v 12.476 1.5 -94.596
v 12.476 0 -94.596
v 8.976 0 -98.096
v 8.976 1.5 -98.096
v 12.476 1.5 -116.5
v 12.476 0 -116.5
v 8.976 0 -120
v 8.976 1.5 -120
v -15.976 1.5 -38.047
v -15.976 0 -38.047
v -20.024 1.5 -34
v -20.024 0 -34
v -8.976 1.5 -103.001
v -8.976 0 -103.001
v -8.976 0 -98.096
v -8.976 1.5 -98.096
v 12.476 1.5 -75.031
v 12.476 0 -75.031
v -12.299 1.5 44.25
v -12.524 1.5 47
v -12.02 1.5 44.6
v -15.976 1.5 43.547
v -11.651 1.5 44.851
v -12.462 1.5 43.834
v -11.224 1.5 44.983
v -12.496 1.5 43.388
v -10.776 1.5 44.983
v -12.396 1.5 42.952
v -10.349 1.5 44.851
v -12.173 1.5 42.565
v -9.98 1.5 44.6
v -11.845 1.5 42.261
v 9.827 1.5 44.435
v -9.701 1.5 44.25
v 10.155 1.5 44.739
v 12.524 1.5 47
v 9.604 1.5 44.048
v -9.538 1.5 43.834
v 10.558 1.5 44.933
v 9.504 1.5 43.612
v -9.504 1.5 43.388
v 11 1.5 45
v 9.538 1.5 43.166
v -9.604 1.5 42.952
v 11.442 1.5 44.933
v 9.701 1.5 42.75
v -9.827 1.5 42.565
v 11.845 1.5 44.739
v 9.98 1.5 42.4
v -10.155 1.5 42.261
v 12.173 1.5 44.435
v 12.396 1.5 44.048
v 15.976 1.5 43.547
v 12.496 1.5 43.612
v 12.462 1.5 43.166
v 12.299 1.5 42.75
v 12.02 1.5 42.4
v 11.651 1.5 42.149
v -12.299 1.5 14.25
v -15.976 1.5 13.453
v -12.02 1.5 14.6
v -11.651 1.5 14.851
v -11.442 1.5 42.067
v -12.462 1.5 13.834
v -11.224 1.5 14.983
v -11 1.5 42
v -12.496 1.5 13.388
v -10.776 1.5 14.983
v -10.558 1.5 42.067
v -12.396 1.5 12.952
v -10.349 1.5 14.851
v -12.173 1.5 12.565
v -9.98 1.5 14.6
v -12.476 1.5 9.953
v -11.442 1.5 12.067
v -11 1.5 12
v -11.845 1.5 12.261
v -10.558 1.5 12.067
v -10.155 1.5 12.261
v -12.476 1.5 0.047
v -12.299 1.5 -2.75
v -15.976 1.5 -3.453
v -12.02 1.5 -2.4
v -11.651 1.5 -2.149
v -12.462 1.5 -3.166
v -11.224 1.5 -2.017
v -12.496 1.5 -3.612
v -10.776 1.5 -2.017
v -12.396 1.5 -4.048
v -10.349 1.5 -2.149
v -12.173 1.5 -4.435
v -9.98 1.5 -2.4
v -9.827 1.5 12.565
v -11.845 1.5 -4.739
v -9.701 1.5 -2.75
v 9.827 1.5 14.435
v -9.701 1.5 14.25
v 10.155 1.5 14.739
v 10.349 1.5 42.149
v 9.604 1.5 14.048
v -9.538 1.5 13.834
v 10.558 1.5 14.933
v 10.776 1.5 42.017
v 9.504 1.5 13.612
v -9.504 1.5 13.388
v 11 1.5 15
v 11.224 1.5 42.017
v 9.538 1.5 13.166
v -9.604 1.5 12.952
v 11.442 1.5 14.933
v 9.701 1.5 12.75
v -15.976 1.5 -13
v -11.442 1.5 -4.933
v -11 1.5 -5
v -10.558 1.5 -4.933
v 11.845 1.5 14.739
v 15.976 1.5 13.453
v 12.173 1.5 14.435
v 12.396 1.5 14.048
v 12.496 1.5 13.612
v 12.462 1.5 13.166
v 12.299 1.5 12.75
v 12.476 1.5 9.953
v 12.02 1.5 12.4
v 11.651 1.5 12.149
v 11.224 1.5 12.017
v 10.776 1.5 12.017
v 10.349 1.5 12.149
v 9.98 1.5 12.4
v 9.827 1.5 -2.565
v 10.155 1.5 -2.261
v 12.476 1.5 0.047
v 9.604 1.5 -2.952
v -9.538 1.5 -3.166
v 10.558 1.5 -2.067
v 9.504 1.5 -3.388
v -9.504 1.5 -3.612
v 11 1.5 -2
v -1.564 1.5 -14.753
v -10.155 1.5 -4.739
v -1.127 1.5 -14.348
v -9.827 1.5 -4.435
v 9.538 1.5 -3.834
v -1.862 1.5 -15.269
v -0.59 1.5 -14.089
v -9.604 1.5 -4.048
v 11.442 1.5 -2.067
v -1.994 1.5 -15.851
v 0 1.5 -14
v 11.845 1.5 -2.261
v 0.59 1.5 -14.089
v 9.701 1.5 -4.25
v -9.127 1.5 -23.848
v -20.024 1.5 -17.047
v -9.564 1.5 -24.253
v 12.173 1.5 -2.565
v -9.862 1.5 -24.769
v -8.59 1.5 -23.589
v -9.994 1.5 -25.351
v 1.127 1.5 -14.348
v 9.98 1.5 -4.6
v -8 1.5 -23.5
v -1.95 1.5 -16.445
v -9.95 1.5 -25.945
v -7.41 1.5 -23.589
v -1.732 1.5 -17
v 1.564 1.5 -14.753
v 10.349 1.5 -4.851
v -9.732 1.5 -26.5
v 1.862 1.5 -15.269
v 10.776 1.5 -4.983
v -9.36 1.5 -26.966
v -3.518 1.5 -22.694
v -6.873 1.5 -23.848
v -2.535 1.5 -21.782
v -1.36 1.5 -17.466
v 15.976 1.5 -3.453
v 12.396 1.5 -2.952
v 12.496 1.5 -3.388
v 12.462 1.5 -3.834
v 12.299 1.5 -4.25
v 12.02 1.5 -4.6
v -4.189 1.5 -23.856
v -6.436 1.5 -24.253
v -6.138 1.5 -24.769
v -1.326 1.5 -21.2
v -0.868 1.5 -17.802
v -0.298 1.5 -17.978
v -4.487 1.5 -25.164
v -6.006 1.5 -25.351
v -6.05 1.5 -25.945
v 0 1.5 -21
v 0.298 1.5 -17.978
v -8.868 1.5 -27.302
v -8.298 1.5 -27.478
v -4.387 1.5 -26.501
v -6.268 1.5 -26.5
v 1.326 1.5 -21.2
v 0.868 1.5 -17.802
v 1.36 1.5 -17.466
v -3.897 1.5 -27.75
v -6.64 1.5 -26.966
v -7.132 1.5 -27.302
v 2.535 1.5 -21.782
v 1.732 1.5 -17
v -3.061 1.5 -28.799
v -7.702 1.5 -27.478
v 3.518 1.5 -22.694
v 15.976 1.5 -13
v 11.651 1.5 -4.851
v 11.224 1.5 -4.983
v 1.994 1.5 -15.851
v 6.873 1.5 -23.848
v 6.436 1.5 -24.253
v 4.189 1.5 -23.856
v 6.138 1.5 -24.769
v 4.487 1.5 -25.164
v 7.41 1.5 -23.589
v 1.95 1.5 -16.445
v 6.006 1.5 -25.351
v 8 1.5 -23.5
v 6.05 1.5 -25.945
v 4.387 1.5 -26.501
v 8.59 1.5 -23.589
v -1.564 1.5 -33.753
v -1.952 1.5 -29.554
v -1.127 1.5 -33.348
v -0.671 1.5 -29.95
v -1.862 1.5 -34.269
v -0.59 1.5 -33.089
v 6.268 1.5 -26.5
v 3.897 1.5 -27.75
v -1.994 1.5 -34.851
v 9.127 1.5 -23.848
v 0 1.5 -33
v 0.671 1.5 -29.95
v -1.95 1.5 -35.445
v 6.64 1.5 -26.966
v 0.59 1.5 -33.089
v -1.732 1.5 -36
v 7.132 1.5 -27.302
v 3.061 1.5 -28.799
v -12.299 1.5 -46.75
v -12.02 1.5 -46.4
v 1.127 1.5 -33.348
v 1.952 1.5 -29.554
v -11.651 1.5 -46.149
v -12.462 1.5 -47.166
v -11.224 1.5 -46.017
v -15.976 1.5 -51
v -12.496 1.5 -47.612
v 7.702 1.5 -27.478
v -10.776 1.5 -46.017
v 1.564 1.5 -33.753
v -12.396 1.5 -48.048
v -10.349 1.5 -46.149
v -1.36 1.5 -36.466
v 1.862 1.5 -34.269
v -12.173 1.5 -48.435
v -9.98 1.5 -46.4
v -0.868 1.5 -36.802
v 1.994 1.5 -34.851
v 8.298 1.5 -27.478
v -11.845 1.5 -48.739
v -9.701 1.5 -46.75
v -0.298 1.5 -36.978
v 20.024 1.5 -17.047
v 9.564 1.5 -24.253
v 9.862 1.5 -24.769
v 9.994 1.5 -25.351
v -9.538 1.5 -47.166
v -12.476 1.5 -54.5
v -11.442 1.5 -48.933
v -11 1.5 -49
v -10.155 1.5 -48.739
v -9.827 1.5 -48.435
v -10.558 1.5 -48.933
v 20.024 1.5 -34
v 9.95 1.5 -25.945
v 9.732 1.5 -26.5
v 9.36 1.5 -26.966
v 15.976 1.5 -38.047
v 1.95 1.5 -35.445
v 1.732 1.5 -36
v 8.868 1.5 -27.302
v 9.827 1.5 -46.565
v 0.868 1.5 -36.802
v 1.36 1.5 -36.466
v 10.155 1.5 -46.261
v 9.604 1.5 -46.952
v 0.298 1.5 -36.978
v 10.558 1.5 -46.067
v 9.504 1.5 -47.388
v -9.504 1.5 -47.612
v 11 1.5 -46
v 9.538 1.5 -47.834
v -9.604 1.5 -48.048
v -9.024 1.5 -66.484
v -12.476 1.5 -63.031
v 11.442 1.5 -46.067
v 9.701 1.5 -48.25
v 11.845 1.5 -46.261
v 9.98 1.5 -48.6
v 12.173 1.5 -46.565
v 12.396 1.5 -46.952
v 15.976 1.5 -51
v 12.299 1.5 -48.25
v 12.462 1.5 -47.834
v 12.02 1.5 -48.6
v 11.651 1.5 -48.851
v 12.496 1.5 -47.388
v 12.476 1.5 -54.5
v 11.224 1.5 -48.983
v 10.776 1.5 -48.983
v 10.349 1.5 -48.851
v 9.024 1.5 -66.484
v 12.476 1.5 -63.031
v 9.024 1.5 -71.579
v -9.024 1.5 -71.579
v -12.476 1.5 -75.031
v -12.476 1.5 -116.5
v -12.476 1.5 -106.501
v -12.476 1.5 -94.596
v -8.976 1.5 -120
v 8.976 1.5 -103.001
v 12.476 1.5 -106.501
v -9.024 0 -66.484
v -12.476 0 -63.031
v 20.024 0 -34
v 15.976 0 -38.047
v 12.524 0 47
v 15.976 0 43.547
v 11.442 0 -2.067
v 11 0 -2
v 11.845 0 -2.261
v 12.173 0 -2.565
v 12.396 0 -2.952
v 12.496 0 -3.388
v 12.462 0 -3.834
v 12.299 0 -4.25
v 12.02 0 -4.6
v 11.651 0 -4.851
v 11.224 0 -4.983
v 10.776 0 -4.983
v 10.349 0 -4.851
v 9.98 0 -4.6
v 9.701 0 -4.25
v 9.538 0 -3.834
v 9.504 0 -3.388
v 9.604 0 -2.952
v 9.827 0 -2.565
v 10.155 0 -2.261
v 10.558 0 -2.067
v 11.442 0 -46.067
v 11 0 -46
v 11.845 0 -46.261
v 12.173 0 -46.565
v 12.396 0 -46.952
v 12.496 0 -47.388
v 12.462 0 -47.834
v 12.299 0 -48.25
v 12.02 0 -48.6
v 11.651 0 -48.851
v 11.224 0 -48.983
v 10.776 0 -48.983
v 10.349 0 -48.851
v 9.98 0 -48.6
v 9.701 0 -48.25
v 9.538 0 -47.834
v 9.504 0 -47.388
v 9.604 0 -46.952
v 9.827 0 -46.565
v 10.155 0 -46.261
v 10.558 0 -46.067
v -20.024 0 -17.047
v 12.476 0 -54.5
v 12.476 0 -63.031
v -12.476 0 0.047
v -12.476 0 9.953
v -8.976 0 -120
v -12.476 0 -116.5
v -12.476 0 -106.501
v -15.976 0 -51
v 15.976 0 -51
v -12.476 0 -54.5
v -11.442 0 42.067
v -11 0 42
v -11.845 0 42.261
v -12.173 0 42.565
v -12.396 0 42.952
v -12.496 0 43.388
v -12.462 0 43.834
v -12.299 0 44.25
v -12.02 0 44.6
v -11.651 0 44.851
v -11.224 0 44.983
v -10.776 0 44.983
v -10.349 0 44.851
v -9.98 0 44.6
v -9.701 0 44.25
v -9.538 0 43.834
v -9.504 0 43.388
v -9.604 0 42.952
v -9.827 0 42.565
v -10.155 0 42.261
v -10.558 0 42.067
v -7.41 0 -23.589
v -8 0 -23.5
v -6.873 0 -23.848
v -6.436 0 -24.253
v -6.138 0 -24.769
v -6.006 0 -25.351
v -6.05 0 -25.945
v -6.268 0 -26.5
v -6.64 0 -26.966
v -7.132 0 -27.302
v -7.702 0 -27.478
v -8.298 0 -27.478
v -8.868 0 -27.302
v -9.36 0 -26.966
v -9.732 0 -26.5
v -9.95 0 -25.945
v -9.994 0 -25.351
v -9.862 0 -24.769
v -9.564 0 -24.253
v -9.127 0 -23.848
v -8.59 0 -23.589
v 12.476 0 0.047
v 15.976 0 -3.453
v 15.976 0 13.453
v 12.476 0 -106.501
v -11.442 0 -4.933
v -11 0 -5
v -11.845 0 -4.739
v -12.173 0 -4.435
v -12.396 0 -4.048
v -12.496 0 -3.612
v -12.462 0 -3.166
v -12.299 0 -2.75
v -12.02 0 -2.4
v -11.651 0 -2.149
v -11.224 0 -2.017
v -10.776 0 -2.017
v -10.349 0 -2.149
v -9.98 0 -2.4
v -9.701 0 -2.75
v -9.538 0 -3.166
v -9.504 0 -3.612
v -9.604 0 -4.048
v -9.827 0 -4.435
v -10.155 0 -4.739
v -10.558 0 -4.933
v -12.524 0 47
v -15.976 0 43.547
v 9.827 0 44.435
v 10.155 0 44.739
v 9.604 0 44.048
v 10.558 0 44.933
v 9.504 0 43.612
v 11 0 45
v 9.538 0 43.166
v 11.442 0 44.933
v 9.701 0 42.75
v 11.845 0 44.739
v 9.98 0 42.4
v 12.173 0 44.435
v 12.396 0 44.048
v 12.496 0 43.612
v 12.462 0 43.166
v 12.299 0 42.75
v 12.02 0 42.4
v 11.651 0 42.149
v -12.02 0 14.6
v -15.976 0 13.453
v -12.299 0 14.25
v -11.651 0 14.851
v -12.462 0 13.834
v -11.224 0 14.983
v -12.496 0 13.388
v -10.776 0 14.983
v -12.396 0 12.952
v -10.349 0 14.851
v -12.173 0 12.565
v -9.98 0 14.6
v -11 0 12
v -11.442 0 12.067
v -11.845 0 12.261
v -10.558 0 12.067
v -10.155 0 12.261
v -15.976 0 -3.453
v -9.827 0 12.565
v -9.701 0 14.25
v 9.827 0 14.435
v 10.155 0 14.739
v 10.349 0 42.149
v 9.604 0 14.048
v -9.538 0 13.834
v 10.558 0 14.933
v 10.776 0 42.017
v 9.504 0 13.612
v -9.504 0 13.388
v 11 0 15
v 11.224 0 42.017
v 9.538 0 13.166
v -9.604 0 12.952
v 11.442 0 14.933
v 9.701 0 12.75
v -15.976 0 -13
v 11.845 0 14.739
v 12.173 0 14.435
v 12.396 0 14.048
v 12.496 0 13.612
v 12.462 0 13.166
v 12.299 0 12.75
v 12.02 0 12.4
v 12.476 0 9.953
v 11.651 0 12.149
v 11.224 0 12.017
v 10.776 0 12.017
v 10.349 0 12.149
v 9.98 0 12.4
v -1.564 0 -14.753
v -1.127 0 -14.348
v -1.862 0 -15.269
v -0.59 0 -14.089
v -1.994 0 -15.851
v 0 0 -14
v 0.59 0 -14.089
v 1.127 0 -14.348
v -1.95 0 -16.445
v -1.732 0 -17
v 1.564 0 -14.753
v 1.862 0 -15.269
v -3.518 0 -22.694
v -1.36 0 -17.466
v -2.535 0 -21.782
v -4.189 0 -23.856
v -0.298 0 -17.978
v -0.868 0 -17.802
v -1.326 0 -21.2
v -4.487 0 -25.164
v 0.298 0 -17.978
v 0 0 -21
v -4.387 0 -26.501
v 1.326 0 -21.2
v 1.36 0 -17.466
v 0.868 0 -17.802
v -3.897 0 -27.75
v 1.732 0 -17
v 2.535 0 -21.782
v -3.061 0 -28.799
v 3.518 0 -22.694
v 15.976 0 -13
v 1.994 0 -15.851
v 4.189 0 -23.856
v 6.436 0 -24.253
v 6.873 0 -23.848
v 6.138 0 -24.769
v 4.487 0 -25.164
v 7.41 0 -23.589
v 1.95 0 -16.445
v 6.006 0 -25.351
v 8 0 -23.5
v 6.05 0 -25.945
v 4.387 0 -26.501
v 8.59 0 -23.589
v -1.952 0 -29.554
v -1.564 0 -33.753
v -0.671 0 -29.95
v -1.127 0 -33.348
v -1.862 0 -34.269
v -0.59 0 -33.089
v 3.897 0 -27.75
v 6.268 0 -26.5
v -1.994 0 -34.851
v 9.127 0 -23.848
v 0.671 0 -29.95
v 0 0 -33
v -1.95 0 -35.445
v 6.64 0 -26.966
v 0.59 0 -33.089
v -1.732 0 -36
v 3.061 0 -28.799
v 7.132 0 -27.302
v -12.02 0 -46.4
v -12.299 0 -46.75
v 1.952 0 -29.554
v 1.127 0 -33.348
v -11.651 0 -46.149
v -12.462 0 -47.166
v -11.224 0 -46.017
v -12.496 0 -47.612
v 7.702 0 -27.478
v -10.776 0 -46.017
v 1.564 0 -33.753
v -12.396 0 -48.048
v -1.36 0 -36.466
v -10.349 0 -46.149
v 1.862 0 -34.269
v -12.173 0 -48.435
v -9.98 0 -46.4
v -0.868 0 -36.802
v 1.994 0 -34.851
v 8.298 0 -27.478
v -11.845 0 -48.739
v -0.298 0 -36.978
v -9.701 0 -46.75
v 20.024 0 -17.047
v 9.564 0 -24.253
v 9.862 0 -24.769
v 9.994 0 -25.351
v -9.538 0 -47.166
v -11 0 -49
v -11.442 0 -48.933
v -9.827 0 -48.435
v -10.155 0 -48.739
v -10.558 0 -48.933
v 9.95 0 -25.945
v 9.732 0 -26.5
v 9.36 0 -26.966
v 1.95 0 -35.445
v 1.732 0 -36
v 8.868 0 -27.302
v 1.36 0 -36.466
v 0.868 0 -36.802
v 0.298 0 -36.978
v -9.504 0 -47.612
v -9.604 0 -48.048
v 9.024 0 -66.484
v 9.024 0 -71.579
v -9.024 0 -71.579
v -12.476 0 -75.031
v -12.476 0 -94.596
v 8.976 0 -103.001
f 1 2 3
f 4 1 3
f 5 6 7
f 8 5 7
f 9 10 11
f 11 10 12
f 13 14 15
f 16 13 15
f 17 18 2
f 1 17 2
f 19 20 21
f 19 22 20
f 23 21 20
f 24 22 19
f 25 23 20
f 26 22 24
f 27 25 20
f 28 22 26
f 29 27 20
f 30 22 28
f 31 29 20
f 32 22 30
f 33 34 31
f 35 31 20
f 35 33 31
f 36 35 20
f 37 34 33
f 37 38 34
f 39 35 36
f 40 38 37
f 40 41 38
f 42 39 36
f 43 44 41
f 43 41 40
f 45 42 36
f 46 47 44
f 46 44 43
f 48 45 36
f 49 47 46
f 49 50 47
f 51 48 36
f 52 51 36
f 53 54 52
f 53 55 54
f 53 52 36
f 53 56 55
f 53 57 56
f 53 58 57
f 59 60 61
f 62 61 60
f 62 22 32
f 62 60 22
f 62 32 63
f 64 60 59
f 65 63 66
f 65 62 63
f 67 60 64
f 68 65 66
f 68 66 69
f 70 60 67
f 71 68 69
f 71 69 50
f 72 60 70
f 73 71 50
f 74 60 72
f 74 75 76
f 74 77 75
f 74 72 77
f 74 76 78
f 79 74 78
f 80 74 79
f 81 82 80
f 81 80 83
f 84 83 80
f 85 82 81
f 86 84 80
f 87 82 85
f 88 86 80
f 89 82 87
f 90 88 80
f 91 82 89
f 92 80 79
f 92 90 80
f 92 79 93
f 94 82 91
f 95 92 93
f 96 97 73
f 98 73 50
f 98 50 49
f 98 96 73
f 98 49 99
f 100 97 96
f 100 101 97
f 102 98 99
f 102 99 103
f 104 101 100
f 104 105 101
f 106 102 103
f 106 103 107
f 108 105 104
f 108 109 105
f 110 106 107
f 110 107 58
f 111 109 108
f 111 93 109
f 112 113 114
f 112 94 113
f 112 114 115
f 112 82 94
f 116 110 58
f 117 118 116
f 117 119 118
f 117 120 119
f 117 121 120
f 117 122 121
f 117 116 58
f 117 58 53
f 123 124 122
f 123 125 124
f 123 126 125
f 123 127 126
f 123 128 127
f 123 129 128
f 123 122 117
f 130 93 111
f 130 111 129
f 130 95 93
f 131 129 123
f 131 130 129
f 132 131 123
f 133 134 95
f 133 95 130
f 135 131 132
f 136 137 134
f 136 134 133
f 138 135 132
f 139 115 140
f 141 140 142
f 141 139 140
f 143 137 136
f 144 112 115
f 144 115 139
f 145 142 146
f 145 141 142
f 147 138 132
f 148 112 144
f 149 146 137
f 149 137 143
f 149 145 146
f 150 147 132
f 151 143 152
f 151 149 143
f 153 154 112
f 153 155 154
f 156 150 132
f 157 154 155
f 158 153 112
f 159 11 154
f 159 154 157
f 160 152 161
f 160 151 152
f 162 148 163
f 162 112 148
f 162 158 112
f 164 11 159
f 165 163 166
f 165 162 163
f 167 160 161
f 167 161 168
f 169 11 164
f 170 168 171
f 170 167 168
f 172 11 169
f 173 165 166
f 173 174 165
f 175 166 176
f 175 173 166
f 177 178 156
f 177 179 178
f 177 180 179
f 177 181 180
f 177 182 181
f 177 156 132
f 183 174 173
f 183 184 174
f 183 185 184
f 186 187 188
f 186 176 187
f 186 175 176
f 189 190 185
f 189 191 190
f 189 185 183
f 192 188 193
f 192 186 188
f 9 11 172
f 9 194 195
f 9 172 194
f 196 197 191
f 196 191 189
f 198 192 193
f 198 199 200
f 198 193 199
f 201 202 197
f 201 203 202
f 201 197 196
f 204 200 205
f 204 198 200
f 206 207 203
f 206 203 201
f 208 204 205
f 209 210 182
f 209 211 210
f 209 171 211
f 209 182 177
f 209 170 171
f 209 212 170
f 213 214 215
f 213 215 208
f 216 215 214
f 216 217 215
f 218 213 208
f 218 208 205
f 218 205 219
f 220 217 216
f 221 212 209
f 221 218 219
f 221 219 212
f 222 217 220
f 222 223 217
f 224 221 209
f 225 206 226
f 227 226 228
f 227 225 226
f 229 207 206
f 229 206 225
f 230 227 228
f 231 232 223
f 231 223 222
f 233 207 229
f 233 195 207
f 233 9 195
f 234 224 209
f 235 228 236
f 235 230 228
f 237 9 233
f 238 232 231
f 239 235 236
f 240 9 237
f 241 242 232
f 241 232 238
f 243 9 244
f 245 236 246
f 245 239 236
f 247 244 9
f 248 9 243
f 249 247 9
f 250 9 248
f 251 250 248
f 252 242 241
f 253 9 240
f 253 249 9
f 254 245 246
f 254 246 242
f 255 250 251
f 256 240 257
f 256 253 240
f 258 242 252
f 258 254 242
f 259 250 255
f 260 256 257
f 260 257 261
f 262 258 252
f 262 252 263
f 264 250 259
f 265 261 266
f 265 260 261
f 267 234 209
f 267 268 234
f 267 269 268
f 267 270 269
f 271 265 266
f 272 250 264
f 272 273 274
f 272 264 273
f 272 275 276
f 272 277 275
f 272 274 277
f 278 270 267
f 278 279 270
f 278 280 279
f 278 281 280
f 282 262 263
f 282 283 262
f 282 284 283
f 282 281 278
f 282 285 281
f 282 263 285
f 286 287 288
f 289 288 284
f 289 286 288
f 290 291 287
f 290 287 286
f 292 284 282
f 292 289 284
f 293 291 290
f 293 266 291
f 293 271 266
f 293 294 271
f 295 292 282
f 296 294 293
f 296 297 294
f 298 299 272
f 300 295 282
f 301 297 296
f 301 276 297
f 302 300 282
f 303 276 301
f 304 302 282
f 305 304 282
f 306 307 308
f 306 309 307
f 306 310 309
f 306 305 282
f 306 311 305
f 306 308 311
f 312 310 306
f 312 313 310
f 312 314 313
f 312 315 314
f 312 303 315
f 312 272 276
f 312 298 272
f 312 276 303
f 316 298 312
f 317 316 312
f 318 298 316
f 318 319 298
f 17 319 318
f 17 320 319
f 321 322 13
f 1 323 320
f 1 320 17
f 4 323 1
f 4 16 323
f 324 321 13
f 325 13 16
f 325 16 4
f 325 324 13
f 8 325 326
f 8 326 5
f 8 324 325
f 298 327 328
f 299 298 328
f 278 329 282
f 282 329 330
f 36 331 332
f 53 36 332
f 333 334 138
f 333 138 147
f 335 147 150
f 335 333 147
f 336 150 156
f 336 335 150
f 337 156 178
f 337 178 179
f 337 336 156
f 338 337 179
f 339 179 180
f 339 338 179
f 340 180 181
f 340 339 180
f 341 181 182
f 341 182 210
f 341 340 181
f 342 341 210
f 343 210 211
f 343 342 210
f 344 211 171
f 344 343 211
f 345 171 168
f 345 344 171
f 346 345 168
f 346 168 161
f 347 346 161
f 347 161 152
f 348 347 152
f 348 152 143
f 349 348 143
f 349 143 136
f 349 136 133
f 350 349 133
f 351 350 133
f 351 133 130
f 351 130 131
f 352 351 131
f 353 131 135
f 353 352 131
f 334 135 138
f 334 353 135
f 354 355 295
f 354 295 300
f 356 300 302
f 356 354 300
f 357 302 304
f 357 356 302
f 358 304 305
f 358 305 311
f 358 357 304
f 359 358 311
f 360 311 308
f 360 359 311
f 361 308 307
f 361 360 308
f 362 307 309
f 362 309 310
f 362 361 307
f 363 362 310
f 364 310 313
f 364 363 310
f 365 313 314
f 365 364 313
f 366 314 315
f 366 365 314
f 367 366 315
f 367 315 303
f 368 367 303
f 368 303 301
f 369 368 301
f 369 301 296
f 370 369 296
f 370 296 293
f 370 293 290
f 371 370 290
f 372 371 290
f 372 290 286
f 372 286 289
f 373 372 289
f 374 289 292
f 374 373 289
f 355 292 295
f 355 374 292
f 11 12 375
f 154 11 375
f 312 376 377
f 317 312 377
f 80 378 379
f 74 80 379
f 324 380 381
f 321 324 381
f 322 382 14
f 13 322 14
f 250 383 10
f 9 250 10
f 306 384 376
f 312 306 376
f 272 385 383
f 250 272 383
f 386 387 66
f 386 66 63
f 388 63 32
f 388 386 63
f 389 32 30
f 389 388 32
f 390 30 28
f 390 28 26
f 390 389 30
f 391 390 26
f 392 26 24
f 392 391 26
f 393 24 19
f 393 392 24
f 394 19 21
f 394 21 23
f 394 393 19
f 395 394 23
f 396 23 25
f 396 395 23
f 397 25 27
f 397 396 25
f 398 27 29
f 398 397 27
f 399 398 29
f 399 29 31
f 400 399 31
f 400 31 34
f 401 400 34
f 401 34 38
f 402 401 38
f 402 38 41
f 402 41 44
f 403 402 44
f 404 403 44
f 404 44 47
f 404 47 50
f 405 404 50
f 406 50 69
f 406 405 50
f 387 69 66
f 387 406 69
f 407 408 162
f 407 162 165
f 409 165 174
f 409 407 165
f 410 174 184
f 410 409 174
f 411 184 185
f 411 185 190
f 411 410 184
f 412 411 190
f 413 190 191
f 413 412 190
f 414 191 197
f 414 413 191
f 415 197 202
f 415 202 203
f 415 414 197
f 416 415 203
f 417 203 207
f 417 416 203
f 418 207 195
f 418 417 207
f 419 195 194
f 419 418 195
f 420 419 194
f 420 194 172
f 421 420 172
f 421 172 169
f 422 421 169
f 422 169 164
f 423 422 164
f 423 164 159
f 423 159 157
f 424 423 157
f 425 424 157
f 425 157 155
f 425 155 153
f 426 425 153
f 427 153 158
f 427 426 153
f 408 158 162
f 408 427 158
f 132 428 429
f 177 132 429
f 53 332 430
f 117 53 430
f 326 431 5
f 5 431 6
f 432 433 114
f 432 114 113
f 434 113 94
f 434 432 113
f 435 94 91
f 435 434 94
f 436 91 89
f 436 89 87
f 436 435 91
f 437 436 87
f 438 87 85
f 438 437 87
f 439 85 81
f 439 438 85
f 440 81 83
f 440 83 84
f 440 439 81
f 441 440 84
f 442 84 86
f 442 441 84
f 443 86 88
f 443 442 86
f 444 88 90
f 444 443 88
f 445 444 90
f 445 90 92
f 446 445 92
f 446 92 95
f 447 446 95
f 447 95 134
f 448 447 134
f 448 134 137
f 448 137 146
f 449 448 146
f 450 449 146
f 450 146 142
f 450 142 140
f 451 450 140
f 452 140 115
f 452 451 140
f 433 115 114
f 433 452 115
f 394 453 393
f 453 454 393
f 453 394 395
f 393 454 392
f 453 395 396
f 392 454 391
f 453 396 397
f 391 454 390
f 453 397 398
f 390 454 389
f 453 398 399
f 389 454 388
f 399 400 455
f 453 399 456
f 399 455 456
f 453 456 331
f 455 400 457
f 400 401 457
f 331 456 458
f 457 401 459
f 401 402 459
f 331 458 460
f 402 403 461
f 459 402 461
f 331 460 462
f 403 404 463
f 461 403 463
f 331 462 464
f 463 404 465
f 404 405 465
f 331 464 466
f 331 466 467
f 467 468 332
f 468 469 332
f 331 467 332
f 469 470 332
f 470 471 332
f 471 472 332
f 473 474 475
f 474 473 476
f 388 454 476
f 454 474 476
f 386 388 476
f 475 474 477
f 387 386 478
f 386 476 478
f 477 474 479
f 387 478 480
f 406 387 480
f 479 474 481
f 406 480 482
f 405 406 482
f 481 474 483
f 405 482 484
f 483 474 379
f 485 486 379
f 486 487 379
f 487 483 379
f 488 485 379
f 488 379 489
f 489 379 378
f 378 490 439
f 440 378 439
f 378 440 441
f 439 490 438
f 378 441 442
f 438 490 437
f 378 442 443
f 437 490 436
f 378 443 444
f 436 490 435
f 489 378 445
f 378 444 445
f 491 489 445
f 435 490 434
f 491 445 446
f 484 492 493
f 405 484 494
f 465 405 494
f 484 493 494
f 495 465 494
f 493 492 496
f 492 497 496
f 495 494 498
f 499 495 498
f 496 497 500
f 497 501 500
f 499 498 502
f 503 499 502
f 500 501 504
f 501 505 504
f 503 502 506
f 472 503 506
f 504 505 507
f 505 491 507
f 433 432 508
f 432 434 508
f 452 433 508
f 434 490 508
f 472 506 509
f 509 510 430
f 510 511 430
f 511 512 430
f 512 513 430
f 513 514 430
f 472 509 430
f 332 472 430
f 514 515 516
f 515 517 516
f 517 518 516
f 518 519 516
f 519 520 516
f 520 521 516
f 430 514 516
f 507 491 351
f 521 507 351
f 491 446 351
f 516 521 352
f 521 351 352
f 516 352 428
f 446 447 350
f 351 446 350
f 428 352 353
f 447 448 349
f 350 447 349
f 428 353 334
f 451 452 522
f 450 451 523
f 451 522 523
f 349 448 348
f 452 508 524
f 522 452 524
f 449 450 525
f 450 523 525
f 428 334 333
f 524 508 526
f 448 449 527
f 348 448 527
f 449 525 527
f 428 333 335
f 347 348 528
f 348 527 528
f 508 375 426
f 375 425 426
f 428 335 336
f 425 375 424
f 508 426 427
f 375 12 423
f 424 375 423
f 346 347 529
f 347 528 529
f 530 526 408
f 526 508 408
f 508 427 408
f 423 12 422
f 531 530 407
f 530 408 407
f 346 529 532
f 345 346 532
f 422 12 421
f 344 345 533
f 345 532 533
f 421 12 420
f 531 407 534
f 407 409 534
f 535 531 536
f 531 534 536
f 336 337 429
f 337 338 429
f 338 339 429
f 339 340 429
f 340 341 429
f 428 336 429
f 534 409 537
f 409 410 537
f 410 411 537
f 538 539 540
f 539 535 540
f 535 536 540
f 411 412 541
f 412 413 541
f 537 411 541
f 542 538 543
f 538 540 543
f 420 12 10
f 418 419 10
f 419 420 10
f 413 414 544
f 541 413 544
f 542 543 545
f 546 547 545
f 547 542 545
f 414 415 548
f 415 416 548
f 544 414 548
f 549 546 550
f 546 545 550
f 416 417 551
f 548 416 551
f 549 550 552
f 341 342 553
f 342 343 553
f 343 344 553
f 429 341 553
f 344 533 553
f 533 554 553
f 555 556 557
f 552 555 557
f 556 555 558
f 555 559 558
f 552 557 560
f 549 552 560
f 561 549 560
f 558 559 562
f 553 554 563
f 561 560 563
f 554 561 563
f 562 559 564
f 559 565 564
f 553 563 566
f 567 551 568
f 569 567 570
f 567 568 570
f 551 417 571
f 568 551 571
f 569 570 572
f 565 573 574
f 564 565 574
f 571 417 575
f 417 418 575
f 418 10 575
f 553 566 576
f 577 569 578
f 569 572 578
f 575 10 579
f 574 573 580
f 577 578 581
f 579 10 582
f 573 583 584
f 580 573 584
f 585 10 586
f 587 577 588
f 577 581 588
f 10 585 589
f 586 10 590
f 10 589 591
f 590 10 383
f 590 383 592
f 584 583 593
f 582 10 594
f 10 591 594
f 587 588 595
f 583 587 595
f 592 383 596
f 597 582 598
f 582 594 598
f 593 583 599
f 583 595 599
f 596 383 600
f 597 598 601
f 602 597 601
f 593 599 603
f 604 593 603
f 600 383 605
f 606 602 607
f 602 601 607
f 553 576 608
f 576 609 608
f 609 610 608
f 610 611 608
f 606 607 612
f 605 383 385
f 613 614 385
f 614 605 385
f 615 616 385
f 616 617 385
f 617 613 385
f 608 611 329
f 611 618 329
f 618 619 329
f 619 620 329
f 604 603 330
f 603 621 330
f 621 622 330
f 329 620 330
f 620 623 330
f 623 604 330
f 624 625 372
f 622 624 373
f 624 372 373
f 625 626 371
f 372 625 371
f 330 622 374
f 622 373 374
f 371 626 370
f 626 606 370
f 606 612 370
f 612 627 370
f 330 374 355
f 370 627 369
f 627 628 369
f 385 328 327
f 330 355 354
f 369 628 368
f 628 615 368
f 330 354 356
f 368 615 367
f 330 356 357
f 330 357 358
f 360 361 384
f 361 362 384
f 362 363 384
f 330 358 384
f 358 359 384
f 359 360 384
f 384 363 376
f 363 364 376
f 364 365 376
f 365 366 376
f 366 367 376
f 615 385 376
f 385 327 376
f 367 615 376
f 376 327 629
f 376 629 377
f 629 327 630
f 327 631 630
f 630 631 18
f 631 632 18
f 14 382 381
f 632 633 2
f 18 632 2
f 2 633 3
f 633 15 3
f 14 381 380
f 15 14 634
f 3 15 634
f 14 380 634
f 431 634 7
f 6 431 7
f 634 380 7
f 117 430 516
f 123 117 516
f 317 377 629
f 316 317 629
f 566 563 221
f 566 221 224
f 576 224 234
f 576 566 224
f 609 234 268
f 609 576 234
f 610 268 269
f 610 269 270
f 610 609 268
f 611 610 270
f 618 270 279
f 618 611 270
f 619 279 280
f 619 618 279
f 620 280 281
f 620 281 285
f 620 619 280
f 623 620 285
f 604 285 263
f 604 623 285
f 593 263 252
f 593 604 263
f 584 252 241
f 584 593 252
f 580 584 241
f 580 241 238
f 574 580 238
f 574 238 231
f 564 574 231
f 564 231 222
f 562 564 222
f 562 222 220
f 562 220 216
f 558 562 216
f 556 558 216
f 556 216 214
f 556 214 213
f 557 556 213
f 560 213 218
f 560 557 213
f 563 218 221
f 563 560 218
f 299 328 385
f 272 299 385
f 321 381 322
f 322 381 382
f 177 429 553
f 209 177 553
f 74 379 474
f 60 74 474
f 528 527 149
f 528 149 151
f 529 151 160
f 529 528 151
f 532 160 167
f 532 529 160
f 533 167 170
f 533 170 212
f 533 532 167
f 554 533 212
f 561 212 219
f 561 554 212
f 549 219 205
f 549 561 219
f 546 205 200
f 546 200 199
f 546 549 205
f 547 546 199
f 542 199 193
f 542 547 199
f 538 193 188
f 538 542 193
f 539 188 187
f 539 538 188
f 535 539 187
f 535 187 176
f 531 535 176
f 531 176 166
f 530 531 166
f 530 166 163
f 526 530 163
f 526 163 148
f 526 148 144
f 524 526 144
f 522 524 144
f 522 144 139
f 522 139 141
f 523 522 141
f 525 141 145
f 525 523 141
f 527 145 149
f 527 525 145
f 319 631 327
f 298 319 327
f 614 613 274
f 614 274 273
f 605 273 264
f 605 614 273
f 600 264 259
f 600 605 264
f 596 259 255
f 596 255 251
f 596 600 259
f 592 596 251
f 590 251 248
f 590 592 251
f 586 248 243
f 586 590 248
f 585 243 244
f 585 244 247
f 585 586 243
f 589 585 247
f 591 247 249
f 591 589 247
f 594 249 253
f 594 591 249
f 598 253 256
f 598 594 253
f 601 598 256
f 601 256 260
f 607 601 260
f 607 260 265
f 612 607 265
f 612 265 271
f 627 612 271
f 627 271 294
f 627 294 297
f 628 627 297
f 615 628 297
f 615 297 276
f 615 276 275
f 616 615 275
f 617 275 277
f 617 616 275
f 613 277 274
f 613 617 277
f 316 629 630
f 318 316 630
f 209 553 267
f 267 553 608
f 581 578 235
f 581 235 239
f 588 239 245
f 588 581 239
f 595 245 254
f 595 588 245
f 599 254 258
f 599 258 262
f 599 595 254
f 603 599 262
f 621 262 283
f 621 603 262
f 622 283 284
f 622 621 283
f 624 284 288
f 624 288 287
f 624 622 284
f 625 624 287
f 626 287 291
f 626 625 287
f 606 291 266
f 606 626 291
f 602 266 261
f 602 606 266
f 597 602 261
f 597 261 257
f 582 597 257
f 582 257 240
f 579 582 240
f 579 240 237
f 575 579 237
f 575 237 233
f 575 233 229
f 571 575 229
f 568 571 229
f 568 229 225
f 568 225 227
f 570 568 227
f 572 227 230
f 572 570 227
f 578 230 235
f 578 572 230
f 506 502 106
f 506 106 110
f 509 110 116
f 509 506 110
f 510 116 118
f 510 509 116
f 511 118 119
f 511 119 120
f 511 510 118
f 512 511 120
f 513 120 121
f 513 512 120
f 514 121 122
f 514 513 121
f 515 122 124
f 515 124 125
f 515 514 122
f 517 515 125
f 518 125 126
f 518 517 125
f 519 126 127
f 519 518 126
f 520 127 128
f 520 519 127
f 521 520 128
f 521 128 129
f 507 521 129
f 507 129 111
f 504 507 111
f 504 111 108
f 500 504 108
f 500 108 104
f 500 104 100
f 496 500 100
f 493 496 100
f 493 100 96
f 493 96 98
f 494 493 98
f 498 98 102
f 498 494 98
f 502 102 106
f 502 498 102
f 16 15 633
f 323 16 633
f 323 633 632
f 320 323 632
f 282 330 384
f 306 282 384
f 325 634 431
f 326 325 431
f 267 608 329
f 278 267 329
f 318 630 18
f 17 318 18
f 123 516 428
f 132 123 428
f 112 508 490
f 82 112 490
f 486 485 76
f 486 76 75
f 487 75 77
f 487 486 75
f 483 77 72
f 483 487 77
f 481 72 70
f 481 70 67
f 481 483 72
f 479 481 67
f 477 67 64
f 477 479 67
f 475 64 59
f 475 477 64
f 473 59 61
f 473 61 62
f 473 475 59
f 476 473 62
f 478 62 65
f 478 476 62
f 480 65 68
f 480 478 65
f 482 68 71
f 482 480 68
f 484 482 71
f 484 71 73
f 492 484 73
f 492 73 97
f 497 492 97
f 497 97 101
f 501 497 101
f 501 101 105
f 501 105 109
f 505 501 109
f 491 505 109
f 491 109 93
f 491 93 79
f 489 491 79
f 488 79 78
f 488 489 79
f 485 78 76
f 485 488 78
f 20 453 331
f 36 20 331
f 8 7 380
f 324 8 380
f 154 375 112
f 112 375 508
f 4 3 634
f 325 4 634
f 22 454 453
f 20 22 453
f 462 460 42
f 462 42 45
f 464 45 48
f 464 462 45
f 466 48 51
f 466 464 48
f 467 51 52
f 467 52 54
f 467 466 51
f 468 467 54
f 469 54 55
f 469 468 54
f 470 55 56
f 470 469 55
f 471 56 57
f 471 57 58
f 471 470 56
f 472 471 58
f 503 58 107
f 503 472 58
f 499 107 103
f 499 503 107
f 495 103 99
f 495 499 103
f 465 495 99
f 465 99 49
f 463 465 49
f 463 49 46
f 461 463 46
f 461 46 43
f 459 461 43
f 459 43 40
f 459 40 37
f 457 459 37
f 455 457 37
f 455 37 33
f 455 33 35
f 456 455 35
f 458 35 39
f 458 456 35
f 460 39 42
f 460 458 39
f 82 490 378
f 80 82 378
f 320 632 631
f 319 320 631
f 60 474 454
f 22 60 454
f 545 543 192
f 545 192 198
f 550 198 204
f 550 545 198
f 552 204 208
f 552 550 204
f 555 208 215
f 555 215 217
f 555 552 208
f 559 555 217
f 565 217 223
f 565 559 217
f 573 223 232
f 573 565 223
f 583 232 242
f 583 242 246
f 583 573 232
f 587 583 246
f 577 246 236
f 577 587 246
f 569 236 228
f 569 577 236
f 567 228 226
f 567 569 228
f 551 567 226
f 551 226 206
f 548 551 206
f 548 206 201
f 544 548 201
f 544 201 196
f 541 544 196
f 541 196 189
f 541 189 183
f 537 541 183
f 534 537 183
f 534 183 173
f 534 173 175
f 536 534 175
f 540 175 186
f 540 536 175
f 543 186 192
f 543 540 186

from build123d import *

# Parameters (mm, degrees)
SKETCH_1_R      = 4.5
SKETCH_1_R_2    = 2
SKETCH_1_R_3    = 1.5
EXTRUDE_1_DEPTH = 1.5


with BuildPart() as part:
    # 草图1 → 凸台-拉伸1 (new body)
    with BuildSketch(Plane(origin=(0, 0, 0), x_dir=(1, 0, 0), z_dir=(0, 1, 0))):
        Polygon((20.023596815, 17.047193631), (20.023596815, 34), (15.976403185, 38.047193631), (15.976403185, 51), (12.476403185, 54.5), (12.476403185, 57), (12.476403185, 63.031398934), (9.023596815, 66.484205303), (9.023596815, 71.578592565), (12.476403185, 75.031398934), (12.476403185, 94.595844768), (8.976403185, 98.095844768), (8.976403185, 103.001457506), (12.476403185, 106.501457506), (12.476403185, 116.5), (8.976403185, 120), (-8.976403185, 120), (-12.476403185, 116.5), (-12.476403185, 106.501457506), (-8.976403185, 103.001457506), (-8.976403185, 98.095844768), (-12.476403185, 94.595844768), (-12.476403185, 75.031398934), (-9.023596815, 71.578592565), (-9.023596815, 66.484205303), (-12.476403185, 63.031398934), (-12.476403185, 57), (-12.476403185, 54.5), (-15.976403185, 51), (-15.976403185, 38.047193631), (-20.023596815, 34), (-20.023596815, 17.047193631), (-15.976403185, 13), (-15.976403185, 3.452806369), (-12.476403185, -0.047193631), (-12.476403185, -9.952806369), (-15.976403185, -13.452806369), (-15.976403185, -43.547193631), (-12.523596815, -47), (12.523596815, -47), (15.976403185, -43.547193631), (15.976403185, -13.452806369), (12.476403185, -9.952806369), (12.476403185, -0.047193631), (15.976403185, 3.452806369), (15.976403185, 13), align=None)
        with Locations(Location((0, 25.5, 0), (0, 0, 270))):
            Circle(SKETCH_1_R, mode=Mode.SUBTRACT)
        with Locations(Location((8, 25.5, 0), (0, 0, 270))):
            Circle(SKETCH_1_R_2, mode=Mode.SUBTRACT)
        with Locations(Location((0, 16, 0), (0, 0, 270))):
            Circle(SKETCH_1_R_2, mode=Mode.SUBTRACT)
        with Locations(Location((-8, 25.5, 0), (0, 0, 270))):
            Circle(SKETCH_1_R_2, mode=Mode.SUBTRACT)
        with Locations(Location((0, 35, 0), (0, 0, 270))):
            Circle(SKETCH_1_R_2, mode=Mode.SUBTRACT)
        with Locations(Location((11, 3.5, 0), (0, 0, 270))):
            Circle(SKETCH_1_R_3, mode=Mode.SUBTRACT)
        with Locations(Location((11, 47.5, 0), (0, 0, 270))):
            Circle(SKETCH_1_R_3, mode=Mode.SUBTRACT)
        with Locations(Location((-11, 47.5, 0), (0, 0, 90))):
            Circle(SKETCH_1_R_3, mode=Mode.SUBTRACT)
        with Locations(Location((-11, 3.5, 0), (0, 0, 90))):
            Circle(SKETCH_1_R_3, mode=Mode.SUBTRACT)
        with Locations(Location((11, -13.5, 0), (0, 0, 270))):
            Circle(SKETCH_1_R_3, mode=Mode.SUBTRACT)
        with Locations(Location((11, -43.5, 0), (0, 0, 270))):
            Circle(SKETCH_1_R_3, mode=Mode.SUBTRACT)
        with Locations(Location((-11, -13.5, 0), (0, 0, 90))):
            Circle(SKETCH_1_R_3, mode=Mode.SUBTRACT)
        with Locations(Location((-11, -43.5, 0), (0, 0, 90))):
            Circle(SKETCH_1_R_3, mode=Mode.SUBTRACT)
    extrude(amount=EXTRUDE_1_DEPTH)


solid = part.part
